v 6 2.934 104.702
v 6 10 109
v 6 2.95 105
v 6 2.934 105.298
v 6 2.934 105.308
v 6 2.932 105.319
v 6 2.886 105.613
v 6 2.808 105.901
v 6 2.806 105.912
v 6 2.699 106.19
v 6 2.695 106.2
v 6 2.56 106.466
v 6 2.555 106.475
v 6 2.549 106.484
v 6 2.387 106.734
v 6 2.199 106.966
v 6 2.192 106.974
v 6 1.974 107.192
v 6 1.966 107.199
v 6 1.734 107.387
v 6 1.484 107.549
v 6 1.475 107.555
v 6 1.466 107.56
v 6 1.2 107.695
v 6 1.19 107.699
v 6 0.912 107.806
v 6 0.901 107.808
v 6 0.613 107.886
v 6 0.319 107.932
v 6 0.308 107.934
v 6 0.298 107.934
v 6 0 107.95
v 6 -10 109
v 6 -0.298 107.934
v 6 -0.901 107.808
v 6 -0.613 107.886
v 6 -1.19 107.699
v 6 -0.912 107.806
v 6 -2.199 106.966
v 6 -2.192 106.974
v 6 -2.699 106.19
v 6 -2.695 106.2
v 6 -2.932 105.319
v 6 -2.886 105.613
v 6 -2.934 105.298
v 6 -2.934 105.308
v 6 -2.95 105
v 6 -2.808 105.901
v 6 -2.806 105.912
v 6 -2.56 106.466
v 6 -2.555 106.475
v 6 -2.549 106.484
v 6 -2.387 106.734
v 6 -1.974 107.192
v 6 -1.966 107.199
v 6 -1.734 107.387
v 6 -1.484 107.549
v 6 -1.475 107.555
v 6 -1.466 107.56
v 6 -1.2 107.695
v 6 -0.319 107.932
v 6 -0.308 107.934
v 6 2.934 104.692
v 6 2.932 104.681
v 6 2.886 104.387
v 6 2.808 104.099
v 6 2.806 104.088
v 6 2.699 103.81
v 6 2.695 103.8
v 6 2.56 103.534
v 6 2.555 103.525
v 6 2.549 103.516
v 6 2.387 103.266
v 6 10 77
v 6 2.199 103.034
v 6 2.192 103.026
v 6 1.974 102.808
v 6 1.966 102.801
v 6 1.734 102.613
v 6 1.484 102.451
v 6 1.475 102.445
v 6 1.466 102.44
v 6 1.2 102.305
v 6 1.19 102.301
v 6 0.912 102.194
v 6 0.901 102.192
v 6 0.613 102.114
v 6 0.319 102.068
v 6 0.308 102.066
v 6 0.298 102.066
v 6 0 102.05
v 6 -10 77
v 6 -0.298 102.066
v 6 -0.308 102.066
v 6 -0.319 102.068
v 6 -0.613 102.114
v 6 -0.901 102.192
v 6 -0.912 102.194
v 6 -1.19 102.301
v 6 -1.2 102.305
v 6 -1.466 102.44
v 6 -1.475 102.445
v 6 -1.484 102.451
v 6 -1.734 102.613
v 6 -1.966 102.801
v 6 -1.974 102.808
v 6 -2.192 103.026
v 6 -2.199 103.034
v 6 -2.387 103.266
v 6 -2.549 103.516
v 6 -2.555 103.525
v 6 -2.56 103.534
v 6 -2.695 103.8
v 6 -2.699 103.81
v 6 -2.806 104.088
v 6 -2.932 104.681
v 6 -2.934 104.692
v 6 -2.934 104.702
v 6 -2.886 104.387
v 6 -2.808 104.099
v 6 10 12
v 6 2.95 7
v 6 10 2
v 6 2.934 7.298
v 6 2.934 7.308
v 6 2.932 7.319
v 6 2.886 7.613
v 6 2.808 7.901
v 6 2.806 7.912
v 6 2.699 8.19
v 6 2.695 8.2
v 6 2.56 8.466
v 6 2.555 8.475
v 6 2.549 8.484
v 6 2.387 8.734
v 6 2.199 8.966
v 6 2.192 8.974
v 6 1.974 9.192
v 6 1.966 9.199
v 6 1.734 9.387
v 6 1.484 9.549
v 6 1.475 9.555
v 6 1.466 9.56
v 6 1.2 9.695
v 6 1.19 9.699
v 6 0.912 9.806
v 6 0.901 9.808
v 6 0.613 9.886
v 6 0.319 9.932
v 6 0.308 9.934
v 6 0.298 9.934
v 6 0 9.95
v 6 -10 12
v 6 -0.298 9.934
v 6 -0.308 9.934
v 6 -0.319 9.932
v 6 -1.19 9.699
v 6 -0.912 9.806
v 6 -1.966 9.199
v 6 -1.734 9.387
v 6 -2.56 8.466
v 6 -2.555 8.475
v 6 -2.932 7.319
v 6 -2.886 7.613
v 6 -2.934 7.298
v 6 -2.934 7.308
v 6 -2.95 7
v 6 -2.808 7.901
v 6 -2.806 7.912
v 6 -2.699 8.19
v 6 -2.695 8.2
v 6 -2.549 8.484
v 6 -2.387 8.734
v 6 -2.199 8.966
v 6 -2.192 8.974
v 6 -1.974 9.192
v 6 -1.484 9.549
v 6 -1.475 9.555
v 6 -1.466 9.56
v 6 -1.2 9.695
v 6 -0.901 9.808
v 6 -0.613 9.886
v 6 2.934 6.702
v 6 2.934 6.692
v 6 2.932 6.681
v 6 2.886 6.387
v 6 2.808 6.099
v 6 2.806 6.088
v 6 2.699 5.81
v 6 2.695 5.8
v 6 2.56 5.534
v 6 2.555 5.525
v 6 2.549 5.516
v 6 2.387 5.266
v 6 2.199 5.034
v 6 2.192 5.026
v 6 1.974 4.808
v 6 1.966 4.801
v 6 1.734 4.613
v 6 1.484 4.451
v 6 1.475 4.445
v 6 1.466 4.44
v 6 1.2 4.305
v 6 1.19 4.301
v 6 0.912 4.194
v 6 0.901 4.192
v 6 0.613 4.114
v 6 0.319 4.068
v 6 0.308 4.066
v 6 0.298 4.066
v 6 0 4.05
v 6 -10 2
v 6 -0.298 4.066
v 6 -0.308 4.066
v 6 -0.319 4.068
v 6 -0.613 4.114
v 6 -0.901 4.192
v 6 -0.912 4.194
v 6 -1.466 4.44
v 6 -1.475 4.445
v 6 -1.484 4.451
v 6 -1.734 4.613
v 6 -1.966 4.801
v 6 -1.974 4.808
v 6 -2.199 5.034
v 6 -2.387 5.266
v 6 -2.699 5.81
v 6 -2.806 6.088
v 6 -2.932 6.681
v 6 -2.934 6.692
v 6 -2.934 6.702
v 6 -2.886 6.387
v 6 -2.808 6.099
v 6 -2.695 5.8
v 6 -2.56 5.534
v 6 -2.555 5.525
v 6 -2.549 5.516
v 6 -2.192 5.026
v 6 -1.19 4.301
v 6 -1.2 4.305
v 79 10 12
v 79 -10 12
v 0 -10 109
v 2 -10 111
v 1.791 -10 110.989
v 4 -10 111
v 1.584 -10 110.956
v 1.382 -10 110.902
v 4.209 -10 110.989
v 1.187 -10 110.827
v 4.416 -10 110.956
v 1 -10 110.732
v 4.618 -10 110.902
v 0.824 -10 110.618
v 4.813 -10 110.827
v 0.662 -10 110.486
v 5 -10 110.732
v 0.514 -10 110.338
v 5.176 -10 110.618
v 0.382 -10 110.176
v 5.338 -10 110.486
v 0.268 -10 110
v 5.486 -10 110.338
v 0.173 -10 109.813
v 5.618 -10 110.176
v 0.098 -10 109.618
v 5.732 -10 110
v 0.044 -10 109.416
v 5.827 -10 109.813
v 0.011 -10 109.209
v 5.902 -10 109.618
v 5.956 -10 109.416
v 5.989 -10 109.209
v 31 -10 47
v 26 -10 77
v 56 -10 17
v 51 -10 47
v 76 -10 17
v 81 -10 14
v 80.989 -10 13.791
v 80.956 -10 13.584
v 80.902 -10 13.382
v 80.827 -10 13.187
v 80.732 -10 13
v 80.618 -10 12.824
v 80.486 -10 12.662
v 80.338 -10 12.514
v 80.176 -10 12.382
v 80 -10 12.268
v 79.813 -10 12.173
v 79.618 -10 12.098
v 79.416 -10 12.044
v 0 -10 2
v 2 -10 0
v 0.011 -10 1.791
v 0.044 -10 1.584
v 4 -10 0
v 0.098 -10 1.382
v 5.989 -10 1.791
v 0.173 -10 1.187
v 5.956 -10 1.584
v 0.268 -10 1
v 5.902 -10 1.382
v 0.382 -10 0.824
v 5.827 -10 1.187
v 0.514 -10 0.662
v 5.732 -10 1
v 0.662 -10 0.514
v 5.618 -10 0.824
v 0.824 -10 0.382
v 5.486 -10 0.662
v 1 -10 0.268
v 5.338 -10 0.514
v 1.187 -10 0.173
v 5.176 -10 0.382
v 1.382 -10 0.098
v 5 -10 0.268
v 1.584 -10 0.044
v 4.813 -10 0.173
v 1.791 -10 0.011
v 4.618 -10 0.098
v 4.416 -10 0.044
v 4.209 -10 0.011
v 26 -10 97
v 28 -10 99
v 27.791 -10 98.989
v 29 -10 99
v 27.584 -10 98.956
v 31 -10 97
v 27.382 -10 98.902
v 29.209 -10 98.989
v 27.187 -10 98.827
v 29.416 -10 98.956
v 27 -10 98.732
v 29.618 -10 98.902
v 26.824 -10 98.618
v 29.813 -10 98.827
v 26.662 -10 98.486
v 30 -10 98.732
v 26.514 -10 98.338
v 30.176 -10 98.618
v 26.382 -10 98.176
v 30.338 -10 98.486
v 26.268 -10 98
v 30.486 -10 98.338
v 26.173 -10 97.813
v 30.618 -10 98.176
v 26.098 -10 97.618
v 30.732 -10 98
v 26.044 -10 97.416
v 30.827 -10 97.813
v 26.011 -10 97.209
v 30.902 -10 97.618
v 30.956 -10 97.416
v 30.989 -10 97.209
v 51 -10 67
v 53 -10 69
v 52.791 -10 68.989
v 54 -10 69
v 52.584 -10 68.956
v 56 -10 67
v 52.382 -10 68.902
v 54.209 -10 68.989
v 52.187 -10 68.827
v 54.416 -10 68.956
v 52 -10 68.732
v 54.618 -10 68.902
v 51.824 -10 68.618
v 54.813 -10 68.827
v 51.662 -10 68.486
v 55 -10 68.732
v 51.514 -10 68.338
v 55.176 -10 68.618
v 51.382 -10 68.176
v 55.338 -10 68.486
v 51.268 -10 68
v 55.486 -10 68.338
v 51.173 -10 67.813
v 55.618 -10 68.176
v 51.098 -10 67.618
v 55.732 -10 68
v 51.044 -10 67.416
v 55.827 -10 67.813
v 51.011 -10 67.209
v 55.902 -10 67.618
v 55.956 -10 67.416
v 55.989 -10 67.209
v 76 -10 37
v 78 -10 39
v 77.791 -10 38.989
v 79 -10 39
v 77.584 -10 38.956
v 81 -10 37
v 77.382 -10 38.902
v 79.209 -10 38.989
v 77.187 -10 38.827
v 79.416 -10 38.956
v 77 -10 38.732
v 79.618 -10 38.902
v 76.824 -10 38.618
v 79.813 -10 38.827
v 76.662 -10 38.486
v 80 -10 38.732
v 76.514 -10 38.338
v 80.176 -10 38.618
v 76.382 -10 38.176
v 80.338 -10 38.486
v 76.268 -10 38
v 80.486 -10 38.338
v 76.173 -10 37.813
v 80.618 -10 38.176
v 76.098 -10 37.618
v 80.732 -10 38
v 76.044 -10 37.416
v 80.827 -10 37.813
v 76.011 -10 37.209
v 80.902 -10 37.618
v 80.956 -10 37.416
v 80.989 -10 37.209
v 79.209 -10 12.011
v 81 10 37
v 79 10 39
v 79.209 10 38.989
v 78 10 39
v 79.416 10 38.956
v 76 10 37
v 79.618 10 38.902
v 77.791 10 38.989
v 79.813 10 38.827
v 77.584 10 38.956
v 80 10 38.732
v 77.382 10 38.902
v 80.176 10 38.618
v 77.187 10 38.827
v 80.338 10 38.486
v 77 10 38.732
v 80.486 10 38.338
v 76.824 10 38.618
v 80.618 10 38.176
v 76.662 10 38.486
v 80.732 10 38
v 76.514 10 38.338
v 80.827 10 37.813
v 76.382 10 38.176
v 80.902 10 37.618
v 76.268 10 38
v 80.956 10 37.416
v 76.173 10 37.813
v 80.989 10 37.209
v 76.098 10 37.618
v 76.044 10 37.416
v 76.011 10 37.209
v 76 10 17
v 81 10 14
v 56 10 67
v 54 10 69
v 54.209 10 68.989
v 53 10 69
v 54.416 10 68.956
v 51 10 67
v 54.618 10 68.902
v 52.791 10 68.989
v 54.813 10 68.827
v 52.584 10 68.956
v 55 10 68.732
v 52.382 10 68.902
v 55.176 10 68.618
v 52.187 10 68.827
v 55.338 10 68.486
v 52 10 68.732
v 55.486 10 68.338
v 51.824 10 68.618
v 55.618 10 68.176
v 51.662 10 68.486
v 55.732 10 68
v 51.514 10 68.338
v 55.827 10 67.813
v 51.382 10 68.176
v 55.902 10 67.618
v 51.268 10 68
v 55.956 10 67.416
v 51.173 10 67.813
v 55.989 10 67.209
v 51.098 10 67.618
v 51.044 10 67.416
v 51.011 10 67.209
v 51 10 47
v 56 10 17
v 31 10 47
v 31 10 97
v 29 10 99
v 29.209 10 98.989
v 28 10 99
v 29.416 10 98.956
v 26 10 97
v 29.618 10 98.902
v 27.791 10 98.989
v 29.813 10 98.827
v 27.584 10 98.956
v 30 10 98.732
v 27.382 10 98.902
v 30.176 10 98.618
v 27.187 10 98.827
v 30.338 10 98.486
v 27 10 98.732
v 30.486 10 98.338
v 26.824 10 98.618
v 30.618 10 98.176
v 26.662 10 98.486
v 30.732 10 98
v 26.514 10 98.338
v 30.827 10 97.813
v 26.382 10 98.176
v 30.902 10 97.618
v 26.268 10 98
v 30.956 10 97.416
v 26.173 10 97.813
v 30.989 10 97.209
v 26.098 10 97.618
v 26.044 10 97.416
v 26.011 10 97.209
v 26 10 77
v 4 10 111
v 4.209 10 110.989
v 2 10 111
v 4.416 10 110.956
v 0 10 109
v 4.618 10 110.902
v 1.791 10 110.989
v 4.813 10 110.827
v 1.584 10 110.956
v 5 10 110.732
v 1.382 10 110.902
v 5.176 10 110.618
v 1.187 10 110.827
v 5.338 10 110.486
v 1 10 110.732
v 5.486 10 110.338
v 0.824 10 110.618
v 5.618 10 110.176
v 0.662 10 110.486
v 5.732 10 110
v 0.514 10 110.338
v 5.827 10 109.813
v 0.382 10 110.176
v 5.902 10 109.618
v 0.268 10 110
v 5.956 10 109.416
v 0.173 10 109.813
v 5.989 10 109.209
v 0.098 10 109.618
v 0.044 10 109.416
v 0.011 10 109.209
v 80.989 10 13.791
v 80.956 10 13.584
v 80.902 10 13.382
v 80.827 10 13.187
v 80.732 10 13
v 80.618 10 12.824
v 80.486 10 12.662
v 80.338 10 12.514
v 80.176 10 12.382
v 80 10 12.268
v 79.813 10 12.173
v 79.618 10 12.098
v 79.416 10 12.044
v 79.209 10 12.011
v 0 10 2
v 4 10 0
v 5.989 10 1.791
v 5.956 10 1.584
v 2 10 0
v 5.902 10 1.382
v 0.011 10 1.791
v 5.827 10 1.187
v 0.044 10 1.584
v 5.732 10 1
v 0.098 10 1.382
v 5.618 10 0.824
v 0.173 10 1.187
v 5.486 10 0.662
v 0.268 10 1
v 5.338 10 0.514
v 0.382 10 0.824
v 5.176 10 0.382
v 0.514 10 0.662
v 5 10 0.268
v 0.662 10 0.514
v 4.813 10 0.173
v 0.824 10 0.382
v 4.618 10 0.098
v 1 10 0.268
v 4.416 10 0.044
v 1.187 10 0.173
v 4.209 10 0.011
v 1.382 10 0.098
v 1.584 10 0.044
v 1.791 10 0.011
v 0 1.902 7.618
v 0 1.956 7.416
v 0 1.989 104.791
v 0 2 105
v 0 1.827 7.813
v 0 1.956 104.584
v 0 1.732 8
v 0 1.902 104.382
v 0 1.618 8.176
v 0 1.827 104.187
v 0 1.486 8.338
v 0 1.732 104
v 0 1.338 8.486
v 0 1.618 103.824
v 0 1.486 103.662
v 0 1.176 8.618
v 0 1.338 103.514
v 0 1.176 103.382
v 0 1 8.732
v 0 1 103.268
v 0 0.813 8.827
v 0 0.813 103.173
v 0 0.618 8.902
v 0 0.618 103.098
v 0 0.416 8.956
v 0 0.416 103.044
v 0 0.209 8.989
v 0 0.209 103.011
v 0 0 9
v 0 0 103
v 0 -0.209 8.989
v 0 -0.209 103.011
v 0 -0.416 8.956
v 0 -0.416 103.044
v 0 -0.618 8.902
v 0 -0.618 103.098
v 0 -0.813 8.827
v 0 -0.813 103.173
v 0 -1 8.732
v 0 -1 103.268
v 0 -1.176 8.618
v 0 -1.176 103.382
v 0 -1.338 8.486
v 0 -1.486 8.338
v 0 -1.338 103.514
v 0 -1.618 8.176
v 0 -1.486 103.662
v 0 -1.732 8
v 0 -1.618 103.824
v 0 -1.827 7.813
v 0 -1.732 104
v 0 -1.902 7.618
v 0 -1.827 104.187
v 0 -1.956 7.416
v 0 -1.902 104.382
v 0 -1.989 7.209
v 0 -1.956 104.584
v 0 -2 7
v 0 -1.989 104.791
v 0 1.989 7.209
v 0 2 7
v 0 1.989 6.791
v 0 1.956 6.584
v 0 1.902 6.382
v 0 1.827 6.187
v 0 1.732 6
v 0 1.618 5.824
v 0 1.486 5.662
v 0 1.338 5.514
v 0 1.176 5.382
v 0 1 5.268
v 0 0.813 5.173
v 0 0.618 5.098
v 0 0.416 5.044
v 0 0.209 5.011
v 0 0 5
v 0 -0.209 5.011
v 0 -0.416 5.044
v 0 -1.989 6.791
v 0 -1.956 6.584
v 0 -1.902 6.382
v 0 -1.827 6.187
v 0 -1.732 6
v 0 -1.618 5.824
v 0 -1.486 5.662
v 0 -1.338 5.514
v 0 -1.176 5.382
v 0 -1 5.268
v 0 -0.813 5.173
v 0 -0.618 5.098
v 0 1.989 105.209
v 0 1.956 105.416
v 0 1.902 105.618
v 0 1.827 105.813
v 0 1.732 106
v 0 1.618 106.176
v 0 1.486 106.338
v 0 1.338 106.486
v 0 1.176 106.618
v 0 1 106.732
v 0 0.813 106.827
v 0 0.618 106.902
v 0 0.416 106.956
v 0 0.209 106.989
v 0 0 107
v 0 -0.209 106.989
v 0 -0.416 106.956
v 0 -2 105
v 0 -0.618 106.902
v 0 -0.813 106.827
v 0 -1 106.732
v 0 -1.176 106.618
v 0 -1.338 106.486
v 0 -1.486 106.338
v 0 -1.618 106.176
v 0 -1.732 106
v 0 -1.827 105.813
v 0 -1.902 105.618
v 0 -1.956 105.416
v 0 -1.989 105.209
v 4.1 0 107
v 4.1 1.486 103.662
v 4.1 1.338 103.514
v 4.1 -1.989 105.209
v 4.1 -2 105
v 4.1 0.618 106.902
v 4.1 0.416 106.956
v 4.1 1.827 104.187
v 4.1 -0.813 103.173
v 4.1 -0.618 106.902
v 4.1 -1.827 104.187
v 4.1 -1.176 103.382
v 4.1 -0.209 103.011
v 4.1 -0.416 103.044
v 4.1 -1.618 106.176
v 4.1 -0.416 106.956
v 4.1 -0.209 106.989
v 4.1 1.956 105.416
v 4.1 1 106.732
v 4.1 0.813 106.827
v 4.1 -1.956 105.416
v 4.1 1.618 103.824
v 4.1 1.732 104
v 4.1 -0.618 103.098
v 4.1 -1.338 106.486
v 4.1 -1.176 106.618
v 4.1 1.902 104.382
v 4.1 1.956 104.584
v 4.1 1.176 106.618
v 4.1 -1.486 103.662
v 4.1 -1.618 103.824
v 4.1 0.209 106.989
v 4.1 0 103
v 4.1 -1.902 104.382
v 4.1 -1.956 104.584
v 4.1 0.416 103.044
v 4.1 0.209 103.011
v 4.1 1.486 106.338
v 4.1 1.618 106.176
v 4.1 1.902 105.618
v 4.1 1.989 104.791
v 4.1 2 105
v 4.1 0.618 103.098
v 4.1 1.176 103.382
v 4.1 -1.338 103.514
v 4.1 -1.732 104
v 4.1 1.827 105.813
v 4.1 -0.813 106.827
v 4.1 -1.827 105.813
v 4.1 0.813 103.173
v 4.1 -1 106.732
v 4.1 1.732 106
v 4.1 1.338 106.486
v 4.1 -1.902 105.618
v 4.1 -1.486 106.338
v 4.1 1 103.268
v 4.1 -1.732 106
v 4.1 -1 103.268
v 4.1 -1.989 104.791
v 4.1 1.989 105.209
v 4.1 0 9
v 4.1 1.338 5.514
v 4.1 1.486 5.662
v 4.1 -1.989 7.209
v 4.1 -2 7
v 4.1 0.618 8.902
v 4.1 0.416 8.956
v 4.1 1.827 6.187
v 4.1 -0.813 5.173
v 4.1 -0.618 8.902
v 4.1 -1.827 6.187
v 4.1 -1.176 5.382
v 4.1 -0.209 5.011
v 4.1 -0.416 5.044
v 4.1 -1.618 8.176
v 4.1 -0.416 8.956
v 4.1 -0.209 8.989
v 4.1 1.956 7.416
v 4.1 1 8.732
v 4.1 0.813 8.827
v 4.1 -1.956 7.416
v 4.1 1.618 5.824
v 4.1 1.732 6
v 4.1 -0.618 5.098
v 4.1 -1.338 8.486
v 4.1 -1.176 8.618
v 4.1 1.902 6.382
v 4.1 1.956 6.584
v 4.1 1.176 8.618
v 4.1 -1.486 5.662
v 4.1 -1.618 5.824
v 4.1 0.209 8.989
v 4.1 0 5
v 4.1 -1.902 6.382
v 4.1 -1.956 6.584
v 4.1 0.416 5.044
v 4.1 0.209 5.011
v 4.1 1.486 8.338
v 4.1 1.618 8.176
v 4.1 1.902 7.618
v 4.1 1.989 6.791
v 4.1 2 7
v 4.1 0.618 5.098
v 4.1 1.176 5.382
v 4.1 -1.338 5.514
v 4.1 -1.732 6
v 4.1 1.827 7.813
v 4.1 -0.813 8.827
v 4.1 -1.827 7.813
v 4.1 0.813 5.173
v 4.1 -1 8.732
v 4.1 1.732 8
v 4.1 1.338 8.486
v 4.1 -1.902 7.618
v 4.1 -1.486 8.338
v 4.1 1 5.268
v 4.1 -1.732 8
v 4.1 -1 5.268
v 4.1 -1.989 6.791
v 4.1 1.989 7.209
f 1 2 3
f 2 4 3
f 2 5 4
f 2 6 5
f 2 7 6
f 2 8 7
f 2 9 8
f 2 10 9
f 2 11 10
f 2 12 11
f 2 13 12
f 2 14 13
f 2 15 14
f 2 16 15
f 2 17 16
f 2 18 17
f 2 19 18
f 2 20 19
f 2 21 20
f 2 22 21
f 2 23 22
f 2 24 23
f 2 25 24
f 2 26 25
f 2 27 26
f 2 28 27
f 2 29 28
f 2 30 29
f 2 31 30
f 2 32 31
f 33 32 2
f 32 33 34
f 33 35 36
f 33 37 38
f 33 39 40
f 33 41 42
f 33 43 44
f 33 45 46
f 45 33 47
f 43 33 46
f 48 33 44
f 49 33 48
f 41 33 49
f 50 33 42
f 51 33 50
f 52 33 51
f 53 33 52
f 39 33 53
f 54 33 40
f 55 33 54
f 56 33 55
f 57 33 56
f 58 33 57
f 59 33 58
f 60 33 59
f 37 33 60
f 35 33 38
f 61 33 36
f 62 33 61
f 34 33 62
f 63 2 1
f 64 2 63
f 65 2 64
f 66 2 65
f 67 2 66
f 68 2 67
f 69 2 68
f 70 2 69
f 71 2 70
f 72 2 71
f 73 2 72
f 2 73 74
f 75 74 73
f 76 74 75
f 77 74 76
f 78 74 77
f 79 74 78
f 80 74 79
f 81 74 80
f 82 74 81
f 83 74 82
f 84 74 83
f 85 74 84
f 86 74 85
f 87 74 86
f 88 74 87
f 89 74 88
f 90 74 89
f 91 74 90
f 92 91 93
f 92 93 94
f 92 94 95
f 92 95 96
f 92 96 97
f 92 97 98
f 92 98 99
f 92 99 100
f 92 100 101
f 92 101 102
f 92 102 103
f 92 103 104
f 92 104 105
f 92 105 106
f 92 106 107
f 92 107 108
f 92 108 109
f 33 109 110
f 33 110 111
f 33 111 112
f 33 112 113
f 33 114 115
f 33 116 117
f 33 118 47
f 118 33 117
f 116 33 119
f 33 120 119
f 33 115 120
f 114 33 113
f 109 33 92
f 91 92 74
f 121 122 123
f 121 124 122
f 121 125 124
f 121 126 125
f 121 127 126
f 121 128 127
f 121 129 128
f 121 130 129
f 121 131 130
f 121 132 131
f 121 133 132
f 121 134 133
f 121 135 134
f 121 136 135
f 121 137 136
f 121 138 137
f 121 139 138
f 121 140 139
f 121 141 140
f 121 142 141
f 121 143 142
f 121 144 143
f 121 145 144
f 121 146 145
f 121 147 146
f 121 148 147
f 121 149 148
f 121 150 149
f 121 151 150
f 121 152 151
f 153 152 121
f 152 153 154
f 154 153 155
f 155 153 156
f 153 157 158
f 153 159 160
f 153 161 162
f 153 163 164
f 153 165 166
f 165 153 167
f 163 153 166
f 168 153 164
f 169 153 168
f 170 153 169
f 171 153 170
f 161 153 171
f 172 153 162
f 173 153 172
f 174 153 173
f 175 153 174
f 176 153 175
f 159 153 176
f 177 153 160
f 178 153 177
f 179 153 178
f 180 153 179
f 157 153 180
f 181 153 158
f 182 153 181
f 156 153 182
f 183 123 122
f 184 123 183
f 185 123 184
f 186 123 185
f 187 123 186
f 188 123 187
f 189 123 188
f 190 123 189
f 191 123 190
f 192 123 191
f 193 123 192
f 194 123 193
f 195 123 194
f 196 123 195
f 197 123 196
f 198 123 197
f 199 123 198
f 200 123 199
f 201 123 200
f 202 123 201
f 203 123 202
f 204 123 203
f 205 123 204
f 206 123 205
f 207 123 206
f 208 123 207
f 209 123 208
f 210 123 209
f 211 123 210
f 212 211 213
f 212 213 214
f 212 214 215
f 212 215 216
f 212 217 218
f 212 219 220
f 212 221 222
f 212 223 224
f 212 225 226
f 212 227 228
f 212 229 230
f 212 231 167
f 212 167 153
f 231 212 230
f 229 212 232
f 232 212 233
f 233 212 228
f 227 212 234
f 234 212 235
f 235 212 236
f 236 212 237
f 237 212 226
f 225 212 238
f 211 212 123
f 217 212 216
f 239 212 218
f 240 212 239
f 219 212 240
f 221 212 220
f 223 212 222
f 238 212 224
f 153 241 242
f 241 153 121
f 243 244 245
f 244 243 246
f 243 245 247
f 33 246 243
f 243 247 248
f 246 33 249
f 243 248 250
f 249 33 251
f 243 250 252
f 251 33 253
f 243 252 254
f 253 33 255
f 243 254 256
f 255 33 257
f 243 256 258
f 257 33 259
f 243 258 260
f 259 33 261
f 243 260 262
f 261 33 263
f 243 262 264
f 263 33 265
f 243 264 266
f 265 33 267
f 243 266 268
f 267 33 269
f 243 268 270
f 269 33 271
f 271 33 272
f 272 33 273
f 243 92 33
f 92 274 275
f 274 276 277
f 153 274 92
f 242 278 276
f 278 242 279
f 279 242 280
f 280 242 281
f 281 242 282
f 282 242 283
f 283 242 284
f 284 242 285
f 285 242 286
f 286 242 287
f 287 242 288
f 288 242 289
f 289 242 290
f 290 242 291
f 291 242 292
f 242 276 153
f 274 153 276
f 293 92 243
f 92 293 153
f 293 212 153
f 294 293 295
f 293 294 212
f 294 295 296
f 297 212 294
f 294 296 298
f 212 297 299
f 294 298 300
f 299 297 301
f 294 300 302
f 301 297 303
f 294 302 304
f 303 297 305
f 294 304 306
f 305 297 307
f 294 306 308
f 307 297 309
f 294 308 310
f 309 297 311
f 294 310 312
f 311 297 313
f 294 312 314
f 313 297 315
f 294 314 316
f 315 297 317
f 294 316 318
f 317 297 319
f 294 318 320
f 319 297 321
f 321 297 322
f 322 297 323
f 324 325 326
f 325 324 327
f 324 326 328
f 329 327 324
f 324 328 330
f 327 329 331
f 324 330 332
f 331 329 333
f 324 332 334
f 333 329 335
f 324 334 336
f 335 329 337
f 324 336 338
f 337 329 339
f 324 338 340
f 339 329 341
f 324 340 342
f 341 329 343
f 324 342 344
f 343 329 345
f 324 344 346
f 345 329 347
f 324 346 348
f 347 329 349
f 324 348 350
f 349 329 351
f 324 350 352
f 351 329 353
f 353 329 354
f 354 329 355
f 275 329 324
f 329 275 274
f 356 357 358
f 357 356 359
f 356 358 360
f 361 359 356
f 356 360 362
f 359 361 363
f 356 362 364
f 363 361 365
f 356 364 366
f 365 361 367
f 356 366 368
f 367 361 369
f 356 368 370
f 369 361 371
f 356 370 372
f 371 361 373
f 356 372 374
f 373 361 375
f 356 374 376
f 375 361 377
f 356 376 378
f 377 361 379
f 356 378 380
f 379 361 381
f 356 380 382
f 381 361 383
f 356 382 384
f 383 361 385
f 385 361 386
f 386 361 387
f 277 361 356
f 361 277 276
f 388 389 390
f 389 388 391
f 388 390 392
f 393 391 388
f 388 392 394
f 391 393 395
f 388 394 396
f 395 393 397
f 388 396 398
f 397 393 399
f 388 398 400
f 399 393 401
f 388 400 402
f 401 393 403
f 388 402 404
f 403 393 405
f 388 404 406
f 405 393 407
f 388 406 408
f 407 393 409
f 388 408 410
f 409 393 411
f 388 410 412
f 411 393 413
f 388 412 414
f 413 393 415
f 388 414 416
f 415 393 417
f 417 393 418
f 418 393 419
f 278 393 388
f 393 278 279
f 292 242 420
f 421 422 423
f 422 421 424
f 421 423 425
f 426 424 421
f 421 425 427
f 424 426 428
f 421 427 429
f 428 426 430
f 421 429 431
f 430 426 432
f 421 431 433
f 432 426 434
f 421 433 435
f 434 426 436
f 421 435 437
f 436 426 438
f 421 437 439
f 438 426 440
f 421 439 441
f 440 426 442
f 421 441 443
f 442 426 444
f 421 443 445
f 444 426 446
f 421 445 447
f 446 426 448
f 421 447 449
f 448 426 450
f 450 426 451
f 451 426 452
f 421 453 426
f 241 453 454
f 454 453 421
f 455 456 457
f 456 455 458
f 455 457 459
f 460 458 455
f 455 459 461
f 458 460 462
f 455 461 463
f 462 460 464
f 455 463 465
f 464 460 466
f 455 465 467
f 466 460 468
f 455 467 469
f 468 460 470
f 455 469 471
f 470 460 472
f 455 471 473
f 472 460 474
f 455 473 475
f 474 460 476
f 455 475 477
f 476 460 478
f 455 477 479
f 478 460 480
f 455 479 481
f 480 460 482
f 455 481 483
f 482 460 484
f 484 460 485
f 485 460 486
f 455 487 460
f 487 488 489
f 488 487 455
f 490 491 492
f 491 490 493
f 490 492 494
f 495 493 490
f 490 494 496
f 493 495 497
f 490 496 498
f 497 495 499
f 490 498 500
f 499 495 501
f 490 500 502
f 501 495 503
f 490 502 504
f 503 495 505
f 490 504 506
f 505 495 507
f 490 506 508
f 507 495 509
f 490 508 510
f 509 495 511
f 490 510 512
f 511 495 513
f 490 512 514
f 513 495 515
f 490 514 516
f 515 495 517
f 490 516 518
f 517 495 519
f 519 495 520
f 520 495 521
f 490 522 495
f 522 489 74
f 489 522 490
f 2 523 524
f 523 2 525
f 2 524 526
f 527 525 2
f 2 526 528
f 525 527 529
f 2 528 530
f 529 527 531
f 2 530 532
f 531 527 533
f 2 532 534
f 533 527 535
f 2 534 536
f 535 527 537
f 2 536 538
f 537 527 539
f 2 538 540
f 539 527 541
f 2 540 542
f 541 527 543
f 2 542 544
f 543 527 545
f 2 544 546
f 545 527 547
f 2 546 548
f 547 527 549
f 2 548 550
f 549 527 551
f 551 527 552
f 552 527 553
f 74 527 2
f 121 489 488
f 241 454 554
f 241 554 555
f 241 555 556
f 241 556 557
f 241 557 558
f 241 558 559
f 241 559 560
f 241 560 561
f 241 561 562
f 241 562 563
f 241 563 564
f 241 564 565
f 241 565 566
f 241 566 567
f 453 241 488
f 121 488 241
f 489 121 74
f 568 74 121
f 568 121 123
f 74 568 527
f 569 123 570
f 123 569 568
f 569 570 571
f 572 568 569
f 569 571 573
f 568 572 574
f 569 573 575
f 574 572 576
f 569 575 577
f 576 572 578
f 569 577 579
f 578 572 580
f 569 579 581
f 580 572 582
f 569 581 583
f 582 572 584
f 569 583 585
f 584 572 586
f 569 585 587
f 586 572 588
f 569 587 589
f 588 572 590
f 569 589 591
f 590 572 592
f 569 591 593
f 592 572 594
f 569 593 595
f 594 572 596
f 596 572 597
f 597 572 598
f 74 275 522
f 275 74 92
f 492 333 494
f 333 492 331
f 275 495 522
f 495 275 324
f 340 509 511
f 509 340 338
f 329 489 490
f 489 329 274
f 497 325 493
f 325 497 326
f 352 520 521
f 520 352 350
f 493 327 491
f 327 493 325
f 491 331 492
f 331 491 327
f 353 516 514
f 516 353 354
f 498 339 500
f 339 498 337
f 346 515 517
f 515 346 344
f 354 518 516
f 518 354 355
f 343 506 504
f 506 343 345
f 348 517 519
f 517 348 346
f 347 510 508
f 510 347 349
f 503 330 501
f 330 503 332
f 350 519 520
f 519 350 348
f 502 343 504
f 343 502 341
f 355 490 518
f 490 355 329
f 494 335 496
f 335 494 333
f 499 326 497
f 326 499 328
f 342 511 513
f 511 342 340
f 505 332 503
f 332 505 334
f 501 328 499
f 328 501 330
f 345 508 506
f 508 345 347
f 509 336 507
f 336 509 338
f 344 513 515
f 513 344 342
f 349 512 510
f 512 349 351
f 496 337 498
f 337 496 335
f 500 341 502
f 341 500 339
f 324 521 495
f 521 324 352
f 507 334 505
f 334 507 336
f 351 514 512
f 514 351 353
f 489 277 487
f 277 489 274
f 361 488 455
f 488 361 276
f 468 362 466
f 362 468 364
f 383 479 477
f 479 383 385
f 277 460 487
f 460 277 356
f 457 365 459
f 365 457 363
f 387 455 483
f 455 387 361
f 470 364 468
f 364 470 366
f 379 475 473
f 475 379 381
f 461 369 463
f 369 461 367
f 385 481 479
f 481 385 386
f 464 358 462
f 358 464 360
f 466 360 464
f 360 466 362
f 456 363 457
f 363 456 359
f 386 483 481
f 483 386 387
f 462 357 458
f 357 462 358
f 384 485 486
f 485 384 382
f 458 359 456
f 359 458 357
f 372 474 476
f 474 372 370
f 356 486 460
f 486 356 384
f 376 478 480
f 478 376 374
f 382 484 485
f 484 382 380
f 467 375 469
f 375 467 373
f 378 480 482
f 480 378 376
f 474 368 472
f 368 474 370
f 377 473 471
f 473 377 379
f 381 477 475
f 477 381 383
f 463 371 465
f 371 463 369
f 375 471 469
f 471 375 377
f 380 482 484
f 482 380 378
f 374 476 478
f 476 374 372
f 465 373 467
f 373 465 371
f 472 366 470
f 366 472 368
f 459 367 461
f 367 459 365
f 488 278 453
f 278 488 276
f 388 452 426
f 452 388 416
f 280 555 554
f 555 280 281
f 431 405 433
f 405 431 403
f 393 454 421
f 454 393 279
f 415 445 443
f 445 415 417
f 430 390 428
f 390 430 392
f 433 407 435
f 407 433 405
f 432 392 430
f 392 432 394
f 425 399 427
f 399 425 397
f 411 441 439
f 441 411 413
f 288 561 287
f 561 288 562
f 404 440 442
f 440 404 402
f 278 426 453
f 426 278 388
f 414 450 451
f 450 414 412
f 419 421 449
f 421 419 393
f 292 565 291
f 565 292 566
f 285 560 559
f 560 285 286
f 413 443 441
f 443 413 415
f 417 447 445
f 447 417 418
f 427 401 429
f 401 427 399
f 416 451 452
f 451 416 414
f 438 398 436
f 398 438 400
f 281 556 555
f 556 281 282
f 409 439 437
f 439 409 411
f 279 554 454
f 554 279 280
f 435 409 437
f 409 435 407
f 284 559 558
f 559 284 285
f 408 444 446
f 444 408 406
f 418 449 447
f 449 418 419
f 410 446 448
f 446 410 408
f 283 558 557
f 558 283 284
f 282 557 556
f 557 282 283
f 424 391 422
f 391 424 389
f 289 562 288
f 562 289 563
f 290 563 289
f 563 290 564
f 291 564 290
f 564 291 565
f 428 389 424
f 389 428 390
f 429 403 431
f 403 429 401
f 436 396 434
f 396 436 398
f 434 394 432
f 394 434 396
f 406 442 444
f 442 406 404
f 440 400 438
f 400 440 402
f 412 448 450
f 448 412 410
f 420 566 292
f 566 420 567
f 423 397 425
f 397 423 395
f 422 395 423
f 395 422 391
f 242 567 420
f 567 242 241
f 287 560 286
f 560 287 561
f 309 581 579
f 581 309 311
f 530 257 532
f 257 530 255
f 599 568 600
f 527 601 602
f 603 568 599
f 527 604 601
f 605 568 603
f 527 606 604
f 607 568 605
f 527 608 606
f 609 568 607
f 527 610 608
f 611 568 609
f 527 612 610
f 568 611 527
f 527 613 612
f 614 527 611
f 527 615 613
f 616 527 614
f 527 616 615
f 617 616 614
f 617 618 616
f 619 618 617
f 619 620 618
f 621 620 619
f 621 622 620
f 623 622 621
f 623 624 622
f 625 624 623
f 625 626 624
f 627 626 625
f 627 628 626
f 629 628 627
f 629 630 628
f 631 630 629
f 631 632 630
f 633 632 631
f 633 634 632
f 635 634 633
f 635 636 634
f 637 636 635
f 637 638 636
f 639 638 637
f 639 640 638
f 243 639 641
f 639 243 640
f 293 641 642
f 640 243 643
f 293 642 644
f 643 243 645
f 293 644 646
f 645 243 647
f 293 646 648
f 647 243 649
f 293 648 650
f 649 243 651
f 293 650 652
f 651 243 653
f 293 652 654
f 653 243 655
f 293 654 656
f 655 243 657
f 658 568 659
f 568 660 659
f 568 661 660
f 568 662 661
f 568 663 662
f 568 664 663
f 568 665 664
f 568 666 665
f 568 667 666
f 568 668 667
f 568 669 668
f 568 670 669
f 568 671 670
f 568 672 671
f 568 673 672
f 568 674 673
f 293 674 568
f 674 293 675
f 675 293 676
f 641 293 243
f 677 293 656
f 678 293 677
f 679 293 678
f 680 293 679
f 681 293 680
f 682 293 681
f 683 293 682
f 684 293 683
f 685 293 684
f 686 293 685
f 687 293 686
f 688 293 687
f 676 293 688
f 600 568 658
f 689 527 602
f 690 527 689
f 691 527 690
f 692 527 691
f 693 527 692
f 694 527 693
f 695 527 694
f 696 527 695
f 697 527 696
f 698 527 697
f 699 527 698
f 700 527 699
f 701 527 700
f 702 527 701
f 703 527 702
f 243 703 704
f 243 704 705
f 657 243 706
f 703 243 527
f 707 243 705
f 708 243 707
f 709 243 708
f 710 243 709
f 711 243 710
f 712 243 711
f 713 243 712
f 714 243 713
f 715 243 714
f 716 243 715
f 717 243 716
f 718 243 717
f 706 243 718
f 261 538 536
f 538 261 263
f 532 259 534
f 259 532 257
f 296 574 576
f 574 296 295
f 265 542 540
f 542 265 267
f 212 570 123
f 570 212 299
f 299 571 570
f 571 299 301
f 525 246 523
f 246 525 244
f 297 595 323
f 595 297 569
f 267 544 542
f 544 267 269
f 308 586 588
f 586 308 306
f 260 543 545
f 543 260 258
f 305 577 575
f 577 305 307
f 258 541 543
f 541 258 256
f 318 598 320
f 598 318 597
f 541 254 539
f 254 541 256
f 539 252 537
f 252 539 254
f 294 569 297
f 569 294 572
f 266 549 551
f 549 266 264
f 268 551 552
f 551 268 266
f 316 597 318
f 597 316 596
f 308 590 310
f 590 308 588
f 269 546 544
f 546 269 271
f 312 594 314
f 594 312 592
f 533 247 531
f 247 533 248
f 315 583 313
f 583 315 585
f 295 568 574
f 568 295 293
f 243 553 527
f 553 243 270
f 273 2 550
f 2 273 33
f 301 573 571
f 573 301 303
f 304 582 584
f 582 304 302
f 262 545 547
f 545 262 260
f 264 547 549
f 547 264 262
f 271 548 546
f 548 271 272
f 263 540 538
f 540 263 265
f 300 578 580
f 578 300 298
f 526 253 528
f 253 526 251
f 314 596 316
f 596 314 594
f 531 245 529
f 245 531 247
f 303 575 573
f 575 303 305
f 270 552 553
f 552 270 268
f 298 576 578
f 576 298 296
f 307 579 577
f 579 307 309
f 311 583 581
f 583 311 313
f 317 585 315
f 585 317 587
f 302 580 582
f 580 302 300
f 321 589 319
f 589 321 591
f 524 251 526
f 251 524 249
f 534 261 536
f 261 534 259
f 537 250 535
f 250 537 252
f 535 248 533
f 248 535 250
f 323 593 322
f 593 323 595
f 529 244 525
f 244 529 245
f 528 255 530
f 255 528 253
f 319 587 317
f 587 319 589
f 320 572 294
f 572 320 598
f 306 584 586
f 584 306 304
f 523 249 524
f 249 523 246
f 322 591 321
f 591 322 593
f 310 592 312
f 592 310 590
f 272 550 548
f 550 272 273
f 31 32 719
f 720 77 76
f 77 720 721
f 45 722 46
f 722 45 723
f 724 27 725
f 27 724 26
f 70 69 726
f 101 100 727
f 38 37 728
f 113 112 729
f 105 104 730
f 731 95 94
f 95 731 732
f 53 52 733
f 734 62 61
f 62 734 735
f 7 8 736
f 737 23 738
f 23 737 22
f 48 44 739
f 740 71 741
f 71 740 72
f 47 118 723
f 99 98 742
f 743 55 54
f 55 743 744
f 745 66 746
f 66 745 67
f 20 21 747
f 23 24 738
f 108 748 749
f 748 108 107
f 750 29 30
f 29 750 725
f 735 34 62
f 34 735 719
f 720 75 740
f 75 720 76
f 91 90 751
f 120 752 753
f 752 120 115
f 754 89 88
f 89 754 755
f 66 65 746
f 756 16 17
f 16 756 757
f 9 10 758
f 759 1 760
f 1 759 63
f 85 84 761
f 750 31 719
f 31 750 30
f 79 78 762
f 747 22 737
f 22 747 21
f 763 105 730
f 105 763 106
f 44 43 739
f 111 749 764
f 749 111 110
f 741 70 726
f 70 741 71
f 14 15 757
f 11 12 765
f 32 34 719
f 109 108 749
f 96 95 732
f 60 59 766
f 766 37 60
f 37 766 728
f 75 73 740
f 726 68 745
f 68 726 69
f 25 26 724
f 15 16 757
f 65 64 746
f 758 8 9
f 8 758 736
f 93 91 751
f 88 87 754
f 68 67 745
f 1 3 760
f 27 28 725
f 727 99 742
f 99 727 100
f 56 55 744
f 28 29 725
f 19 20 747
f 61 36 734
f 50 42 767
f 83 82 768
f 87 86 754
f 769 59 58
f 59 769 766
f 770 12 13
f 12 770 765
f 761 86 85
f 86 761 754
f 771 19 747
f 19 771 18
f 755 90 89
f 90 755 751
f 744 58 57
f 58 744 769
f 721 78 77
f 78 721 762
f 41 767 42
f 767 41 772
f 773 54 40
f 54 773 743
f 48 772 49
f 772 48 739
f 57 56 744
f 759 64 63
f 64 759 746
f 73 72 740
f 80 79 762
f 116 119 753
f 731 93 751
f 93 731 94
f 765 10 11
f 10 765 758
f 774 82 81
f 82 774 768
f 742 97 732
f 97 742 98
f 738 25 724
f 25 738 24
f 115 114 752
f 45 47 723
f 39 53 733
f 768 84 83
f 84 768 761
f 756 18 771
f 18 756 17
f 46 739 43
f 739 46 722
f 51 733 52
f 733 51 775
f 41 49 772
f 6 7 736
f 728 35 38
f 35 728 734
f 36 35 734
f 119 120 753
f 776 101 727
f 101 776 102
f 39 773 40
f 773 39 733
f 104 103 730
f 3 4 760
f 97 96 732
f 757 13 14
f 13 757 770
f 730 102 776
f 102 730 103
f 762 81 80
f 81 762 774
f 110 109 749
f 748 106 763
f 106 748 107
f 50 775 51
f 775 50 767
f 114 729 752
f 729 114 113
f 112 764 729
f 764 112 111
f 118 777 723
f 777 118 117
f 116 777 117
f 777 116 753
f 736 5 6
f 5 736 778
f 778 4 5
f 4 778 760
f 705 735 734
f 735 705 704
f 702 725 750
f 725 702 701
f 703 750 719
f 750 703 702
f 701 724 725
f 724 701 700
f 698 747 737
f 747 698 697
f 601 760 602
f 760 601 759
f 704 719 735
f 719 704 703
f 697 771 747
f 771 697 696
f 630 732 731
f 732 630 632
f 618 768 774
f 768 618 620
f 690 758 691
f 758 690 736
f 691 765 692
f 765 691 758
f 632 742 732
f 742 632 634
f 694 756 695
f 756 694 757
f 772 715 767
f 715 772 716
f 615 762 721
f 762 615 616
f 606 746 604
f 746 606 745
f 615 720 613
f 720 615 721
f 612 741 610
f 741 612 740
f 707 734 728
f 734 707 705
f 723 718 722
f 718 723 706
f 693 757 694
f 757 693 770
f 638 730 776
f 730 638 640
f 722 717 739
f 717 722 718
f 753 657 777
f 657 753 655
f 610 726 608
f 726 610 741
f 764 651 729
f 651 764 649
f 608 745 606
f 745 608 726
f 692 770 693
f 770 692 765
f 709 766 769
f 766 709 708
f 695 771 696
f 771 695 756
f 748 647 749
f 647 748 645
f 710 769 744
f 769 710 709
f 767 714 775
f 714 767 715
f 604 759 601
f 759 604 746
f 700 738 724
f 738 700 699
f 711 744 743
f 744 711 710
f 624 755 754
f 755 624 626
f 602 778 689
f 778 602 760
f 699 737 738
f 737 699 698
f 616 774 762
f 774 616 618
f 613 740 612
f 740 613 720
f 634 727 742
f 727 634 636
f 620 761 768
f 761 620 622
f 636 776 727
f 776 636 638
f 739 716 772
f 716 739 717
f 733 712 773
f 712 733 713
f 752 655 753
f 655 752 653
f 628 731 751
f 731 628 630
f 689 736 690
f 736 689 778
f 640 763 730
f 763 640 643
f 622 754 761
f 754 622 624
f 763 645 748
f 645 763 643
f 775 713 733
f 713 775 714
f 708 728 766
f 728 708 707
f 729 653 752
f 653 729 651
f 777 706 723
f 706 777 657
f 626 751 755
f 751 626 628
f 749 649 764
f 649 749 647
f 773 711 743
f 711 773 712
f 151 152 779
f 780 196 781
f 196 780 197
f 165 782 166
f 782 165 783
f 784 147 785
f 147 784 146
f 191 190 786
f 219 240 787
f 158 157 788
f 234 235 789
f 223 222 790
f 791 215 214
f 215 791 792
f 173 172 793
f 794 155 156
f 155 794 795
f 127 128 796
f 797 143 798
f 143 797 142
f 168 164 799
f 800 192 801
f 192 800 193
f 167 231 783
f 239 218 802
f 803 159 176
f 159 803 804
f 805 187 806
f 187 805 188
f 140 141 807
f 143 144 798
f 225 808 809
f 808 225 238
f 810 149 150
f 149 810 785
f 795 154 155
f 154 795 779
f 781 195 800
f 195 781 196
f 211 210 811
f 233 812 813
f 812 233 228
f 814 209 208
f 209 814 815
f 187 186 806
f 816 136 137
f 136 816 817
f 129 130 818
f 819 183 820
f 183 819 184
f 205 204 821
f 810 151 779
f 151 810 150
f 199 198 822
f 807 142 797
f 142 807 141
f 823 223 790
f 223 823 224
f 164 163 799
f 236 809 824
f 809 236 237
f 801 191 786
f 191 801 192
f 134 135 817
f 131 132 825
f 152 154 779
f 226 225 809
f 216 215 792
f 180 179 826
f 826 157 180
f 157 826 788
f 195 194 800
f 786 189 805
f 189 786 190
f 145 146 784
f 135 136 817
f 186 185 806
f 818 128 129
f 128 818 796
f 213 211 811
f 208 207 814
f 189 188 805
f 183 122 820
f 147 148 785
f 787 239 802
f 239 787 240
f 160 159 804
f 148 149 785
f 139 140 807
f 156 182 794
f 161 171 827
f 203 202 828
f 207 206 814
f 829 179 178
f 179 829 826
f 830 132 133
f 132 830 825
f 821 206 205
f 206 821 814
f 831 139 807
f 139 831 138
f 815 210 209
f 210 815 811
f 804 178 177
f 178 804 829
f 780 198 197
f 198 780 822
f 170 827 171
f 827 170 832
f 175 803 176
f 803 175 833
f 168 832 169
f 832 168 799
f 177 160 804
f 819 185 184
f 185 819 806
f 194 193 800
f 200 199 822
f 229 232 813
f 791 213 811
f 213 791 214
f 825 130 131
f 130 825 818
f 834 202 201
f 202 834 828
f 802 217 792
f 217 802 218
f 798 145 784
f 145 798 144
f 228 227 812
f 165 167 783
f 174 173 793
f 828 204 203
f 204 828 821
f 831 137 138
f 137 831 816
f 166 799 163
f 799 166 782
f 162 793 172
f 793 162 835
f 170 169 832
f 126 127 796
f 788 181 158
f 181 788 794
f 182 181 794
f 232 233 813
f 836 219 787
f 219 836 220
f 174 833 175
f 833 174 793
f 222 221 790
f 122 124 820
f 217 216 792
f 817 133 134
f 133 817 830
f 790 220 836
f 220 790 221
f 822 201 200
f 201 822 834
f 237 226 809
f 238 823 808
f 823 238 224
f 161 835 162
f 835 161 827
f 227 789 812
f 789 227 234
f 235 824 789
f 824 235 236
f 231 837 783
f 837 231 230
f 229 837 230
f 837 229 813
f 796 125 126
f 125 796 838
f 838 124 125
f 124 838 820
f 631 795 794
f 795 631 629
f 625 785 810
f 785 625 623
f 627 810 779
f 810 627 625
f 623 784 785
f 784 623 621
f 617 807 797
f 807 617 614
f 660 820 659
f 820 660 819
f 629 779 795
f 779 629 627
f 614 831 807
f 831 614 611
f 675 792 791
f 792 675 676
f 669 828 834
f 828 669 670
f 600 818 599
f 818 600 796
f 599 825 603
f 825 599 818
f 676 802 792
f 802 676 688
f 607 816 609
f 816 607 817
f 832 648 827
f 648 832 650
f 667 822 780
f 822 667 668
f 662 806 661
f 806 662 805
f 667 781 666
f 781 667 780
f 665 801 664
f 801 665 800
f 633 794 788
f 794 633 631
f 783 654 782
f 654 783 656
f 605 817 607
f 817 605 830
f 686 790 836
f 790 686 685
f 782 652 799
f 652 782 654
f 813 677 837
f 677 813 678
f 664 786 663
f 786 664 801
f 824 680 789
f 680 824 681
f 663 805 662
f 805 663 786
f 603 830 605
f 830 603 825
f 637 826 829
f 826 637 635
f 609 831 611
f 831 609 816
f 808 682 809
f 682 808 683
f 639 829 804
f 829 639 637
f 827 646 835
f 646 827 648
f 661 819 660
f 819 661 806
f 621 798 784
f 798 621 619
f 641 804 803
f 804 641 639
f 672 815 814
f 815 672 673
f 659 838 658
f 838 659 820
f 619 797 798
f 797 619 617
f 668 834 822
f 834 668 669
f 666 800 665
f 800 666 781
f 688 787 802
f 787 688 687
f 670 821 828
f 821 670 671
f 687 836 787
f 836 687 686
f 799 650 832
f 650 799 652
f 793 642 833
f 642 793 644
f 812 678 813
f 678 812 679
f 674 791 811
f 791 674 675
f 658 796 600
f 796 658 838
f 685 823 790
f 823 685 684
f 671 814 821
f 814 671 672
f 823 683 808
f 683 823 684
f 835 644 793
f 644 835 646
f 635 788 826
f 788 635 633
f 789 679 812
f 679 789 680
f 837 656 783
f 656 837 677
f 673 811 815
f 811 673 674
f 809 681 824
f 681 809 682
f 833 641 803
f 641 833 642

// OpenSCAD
// Number of sticks to hold
numSticks = 3; // [1:10]

// Stick width
stickWidth = 20; // [1:40]

// Stick height
stickHeight = 20; // [1:40]

// Vertical spacing between sticks
heightDiff = 30; // [10:50]

// Number of drills for the support
numberDrills = 2; // [1, 2]

// Drills diameter
drillDiameter = 4; // [3:8]


/* [Hidden] */

drillWidth = drillDiameter/2;
oDepth = 20;

// Less or equall than support width
wD = 5; // [4:50] 

wSWidth = 6; // [4:50]
wallWidth = min(wSWidth, wD); 


totalSupportHeight = stickHeight + heightDiff * (numSticks - 1) + wallWidth + numberDrills * (drillWidth + 10);

drillShift = (numberDrills - 1) * (drillWidth + 10);


$fn=60;
rad = 2;
difference() {
union(){
wallSupport();
translate([wSWidth-wallWidth >=0 ?  wSWidth-wallWidth : 0, 0, drillShift])
sticksHolder();
}
union() {
translate([wSWidth+0.1, 0, totalSupportHeight-drillWidth-2])
    rotate(a=[0, -90, 0])    
drill(drillWidth, wSWidth+1, 1);

if (numberDrills == 2) {
translate([wSWidth+0.1, 0, 7])
    rotate(a=[0, -90, 0])    
drill(drillWidth, wSWidth+1, 1);
}
}
}

module wallSupport() {
dr = numberDrills * (drillWidth + 10);
translate([0, -oDepth/2, 0])
roundedCube(wSWidth, oDepth, totalSupportHeight, rad);
}

module drill(r, h, chanfer) {
cylinder (r=chanfer+r, h=r, r2=r);  
translate([0, 0, chanfer]) cylinder(r=r, h=h-chanfer); 

}

module sticksHolder() {
    w = 2*wallWidth + stickWidth;
    for (a = [1:numSticks]) {
        translate([(a-1)*(w-wallWidth), -oDepth/2, 0])
        //translate([(a-1)*(w-wallWidth), -oDepth/2, -(a-1)*heightDiff])
                stickHolder(stickWidth, oDepth, stickHeight, numSticks-a);
          
    }
}


module stickHolder(w, d, h, last) {
r=rad;
s = last > 0 ? 1 : 0;
tW = w+2*wallWidth;
tH = h+wallWidth + heightDiff * last;
    roundedCube(wallWidth, d, tH, r);
    translate([wallWidth-r, 0, 0]) cube([w+2*r, d, tH-h]);
    translate([wallWidth+w, 0, 0]) roundedCube(wallWidth, d, tH, r);
}

module roundedCube(w, d, h, r) {
hull() {
translate([r, 0, r]) rotate(a=[-90, 0, 0]) cylinder(r=r, h=d);
translate([w-r, 0, r]) rotate(a=[-90, 0, 0]) cylinder(r=r, h=d);
translate([r, 0, h]) rotate(a=[-90, 0, 0]) cylinder(r=r, h=d);
translate([w-r, 0, h]) rotate(a=[-90, 0, 0]) cylinder(r=r, h=d);    
}
}
